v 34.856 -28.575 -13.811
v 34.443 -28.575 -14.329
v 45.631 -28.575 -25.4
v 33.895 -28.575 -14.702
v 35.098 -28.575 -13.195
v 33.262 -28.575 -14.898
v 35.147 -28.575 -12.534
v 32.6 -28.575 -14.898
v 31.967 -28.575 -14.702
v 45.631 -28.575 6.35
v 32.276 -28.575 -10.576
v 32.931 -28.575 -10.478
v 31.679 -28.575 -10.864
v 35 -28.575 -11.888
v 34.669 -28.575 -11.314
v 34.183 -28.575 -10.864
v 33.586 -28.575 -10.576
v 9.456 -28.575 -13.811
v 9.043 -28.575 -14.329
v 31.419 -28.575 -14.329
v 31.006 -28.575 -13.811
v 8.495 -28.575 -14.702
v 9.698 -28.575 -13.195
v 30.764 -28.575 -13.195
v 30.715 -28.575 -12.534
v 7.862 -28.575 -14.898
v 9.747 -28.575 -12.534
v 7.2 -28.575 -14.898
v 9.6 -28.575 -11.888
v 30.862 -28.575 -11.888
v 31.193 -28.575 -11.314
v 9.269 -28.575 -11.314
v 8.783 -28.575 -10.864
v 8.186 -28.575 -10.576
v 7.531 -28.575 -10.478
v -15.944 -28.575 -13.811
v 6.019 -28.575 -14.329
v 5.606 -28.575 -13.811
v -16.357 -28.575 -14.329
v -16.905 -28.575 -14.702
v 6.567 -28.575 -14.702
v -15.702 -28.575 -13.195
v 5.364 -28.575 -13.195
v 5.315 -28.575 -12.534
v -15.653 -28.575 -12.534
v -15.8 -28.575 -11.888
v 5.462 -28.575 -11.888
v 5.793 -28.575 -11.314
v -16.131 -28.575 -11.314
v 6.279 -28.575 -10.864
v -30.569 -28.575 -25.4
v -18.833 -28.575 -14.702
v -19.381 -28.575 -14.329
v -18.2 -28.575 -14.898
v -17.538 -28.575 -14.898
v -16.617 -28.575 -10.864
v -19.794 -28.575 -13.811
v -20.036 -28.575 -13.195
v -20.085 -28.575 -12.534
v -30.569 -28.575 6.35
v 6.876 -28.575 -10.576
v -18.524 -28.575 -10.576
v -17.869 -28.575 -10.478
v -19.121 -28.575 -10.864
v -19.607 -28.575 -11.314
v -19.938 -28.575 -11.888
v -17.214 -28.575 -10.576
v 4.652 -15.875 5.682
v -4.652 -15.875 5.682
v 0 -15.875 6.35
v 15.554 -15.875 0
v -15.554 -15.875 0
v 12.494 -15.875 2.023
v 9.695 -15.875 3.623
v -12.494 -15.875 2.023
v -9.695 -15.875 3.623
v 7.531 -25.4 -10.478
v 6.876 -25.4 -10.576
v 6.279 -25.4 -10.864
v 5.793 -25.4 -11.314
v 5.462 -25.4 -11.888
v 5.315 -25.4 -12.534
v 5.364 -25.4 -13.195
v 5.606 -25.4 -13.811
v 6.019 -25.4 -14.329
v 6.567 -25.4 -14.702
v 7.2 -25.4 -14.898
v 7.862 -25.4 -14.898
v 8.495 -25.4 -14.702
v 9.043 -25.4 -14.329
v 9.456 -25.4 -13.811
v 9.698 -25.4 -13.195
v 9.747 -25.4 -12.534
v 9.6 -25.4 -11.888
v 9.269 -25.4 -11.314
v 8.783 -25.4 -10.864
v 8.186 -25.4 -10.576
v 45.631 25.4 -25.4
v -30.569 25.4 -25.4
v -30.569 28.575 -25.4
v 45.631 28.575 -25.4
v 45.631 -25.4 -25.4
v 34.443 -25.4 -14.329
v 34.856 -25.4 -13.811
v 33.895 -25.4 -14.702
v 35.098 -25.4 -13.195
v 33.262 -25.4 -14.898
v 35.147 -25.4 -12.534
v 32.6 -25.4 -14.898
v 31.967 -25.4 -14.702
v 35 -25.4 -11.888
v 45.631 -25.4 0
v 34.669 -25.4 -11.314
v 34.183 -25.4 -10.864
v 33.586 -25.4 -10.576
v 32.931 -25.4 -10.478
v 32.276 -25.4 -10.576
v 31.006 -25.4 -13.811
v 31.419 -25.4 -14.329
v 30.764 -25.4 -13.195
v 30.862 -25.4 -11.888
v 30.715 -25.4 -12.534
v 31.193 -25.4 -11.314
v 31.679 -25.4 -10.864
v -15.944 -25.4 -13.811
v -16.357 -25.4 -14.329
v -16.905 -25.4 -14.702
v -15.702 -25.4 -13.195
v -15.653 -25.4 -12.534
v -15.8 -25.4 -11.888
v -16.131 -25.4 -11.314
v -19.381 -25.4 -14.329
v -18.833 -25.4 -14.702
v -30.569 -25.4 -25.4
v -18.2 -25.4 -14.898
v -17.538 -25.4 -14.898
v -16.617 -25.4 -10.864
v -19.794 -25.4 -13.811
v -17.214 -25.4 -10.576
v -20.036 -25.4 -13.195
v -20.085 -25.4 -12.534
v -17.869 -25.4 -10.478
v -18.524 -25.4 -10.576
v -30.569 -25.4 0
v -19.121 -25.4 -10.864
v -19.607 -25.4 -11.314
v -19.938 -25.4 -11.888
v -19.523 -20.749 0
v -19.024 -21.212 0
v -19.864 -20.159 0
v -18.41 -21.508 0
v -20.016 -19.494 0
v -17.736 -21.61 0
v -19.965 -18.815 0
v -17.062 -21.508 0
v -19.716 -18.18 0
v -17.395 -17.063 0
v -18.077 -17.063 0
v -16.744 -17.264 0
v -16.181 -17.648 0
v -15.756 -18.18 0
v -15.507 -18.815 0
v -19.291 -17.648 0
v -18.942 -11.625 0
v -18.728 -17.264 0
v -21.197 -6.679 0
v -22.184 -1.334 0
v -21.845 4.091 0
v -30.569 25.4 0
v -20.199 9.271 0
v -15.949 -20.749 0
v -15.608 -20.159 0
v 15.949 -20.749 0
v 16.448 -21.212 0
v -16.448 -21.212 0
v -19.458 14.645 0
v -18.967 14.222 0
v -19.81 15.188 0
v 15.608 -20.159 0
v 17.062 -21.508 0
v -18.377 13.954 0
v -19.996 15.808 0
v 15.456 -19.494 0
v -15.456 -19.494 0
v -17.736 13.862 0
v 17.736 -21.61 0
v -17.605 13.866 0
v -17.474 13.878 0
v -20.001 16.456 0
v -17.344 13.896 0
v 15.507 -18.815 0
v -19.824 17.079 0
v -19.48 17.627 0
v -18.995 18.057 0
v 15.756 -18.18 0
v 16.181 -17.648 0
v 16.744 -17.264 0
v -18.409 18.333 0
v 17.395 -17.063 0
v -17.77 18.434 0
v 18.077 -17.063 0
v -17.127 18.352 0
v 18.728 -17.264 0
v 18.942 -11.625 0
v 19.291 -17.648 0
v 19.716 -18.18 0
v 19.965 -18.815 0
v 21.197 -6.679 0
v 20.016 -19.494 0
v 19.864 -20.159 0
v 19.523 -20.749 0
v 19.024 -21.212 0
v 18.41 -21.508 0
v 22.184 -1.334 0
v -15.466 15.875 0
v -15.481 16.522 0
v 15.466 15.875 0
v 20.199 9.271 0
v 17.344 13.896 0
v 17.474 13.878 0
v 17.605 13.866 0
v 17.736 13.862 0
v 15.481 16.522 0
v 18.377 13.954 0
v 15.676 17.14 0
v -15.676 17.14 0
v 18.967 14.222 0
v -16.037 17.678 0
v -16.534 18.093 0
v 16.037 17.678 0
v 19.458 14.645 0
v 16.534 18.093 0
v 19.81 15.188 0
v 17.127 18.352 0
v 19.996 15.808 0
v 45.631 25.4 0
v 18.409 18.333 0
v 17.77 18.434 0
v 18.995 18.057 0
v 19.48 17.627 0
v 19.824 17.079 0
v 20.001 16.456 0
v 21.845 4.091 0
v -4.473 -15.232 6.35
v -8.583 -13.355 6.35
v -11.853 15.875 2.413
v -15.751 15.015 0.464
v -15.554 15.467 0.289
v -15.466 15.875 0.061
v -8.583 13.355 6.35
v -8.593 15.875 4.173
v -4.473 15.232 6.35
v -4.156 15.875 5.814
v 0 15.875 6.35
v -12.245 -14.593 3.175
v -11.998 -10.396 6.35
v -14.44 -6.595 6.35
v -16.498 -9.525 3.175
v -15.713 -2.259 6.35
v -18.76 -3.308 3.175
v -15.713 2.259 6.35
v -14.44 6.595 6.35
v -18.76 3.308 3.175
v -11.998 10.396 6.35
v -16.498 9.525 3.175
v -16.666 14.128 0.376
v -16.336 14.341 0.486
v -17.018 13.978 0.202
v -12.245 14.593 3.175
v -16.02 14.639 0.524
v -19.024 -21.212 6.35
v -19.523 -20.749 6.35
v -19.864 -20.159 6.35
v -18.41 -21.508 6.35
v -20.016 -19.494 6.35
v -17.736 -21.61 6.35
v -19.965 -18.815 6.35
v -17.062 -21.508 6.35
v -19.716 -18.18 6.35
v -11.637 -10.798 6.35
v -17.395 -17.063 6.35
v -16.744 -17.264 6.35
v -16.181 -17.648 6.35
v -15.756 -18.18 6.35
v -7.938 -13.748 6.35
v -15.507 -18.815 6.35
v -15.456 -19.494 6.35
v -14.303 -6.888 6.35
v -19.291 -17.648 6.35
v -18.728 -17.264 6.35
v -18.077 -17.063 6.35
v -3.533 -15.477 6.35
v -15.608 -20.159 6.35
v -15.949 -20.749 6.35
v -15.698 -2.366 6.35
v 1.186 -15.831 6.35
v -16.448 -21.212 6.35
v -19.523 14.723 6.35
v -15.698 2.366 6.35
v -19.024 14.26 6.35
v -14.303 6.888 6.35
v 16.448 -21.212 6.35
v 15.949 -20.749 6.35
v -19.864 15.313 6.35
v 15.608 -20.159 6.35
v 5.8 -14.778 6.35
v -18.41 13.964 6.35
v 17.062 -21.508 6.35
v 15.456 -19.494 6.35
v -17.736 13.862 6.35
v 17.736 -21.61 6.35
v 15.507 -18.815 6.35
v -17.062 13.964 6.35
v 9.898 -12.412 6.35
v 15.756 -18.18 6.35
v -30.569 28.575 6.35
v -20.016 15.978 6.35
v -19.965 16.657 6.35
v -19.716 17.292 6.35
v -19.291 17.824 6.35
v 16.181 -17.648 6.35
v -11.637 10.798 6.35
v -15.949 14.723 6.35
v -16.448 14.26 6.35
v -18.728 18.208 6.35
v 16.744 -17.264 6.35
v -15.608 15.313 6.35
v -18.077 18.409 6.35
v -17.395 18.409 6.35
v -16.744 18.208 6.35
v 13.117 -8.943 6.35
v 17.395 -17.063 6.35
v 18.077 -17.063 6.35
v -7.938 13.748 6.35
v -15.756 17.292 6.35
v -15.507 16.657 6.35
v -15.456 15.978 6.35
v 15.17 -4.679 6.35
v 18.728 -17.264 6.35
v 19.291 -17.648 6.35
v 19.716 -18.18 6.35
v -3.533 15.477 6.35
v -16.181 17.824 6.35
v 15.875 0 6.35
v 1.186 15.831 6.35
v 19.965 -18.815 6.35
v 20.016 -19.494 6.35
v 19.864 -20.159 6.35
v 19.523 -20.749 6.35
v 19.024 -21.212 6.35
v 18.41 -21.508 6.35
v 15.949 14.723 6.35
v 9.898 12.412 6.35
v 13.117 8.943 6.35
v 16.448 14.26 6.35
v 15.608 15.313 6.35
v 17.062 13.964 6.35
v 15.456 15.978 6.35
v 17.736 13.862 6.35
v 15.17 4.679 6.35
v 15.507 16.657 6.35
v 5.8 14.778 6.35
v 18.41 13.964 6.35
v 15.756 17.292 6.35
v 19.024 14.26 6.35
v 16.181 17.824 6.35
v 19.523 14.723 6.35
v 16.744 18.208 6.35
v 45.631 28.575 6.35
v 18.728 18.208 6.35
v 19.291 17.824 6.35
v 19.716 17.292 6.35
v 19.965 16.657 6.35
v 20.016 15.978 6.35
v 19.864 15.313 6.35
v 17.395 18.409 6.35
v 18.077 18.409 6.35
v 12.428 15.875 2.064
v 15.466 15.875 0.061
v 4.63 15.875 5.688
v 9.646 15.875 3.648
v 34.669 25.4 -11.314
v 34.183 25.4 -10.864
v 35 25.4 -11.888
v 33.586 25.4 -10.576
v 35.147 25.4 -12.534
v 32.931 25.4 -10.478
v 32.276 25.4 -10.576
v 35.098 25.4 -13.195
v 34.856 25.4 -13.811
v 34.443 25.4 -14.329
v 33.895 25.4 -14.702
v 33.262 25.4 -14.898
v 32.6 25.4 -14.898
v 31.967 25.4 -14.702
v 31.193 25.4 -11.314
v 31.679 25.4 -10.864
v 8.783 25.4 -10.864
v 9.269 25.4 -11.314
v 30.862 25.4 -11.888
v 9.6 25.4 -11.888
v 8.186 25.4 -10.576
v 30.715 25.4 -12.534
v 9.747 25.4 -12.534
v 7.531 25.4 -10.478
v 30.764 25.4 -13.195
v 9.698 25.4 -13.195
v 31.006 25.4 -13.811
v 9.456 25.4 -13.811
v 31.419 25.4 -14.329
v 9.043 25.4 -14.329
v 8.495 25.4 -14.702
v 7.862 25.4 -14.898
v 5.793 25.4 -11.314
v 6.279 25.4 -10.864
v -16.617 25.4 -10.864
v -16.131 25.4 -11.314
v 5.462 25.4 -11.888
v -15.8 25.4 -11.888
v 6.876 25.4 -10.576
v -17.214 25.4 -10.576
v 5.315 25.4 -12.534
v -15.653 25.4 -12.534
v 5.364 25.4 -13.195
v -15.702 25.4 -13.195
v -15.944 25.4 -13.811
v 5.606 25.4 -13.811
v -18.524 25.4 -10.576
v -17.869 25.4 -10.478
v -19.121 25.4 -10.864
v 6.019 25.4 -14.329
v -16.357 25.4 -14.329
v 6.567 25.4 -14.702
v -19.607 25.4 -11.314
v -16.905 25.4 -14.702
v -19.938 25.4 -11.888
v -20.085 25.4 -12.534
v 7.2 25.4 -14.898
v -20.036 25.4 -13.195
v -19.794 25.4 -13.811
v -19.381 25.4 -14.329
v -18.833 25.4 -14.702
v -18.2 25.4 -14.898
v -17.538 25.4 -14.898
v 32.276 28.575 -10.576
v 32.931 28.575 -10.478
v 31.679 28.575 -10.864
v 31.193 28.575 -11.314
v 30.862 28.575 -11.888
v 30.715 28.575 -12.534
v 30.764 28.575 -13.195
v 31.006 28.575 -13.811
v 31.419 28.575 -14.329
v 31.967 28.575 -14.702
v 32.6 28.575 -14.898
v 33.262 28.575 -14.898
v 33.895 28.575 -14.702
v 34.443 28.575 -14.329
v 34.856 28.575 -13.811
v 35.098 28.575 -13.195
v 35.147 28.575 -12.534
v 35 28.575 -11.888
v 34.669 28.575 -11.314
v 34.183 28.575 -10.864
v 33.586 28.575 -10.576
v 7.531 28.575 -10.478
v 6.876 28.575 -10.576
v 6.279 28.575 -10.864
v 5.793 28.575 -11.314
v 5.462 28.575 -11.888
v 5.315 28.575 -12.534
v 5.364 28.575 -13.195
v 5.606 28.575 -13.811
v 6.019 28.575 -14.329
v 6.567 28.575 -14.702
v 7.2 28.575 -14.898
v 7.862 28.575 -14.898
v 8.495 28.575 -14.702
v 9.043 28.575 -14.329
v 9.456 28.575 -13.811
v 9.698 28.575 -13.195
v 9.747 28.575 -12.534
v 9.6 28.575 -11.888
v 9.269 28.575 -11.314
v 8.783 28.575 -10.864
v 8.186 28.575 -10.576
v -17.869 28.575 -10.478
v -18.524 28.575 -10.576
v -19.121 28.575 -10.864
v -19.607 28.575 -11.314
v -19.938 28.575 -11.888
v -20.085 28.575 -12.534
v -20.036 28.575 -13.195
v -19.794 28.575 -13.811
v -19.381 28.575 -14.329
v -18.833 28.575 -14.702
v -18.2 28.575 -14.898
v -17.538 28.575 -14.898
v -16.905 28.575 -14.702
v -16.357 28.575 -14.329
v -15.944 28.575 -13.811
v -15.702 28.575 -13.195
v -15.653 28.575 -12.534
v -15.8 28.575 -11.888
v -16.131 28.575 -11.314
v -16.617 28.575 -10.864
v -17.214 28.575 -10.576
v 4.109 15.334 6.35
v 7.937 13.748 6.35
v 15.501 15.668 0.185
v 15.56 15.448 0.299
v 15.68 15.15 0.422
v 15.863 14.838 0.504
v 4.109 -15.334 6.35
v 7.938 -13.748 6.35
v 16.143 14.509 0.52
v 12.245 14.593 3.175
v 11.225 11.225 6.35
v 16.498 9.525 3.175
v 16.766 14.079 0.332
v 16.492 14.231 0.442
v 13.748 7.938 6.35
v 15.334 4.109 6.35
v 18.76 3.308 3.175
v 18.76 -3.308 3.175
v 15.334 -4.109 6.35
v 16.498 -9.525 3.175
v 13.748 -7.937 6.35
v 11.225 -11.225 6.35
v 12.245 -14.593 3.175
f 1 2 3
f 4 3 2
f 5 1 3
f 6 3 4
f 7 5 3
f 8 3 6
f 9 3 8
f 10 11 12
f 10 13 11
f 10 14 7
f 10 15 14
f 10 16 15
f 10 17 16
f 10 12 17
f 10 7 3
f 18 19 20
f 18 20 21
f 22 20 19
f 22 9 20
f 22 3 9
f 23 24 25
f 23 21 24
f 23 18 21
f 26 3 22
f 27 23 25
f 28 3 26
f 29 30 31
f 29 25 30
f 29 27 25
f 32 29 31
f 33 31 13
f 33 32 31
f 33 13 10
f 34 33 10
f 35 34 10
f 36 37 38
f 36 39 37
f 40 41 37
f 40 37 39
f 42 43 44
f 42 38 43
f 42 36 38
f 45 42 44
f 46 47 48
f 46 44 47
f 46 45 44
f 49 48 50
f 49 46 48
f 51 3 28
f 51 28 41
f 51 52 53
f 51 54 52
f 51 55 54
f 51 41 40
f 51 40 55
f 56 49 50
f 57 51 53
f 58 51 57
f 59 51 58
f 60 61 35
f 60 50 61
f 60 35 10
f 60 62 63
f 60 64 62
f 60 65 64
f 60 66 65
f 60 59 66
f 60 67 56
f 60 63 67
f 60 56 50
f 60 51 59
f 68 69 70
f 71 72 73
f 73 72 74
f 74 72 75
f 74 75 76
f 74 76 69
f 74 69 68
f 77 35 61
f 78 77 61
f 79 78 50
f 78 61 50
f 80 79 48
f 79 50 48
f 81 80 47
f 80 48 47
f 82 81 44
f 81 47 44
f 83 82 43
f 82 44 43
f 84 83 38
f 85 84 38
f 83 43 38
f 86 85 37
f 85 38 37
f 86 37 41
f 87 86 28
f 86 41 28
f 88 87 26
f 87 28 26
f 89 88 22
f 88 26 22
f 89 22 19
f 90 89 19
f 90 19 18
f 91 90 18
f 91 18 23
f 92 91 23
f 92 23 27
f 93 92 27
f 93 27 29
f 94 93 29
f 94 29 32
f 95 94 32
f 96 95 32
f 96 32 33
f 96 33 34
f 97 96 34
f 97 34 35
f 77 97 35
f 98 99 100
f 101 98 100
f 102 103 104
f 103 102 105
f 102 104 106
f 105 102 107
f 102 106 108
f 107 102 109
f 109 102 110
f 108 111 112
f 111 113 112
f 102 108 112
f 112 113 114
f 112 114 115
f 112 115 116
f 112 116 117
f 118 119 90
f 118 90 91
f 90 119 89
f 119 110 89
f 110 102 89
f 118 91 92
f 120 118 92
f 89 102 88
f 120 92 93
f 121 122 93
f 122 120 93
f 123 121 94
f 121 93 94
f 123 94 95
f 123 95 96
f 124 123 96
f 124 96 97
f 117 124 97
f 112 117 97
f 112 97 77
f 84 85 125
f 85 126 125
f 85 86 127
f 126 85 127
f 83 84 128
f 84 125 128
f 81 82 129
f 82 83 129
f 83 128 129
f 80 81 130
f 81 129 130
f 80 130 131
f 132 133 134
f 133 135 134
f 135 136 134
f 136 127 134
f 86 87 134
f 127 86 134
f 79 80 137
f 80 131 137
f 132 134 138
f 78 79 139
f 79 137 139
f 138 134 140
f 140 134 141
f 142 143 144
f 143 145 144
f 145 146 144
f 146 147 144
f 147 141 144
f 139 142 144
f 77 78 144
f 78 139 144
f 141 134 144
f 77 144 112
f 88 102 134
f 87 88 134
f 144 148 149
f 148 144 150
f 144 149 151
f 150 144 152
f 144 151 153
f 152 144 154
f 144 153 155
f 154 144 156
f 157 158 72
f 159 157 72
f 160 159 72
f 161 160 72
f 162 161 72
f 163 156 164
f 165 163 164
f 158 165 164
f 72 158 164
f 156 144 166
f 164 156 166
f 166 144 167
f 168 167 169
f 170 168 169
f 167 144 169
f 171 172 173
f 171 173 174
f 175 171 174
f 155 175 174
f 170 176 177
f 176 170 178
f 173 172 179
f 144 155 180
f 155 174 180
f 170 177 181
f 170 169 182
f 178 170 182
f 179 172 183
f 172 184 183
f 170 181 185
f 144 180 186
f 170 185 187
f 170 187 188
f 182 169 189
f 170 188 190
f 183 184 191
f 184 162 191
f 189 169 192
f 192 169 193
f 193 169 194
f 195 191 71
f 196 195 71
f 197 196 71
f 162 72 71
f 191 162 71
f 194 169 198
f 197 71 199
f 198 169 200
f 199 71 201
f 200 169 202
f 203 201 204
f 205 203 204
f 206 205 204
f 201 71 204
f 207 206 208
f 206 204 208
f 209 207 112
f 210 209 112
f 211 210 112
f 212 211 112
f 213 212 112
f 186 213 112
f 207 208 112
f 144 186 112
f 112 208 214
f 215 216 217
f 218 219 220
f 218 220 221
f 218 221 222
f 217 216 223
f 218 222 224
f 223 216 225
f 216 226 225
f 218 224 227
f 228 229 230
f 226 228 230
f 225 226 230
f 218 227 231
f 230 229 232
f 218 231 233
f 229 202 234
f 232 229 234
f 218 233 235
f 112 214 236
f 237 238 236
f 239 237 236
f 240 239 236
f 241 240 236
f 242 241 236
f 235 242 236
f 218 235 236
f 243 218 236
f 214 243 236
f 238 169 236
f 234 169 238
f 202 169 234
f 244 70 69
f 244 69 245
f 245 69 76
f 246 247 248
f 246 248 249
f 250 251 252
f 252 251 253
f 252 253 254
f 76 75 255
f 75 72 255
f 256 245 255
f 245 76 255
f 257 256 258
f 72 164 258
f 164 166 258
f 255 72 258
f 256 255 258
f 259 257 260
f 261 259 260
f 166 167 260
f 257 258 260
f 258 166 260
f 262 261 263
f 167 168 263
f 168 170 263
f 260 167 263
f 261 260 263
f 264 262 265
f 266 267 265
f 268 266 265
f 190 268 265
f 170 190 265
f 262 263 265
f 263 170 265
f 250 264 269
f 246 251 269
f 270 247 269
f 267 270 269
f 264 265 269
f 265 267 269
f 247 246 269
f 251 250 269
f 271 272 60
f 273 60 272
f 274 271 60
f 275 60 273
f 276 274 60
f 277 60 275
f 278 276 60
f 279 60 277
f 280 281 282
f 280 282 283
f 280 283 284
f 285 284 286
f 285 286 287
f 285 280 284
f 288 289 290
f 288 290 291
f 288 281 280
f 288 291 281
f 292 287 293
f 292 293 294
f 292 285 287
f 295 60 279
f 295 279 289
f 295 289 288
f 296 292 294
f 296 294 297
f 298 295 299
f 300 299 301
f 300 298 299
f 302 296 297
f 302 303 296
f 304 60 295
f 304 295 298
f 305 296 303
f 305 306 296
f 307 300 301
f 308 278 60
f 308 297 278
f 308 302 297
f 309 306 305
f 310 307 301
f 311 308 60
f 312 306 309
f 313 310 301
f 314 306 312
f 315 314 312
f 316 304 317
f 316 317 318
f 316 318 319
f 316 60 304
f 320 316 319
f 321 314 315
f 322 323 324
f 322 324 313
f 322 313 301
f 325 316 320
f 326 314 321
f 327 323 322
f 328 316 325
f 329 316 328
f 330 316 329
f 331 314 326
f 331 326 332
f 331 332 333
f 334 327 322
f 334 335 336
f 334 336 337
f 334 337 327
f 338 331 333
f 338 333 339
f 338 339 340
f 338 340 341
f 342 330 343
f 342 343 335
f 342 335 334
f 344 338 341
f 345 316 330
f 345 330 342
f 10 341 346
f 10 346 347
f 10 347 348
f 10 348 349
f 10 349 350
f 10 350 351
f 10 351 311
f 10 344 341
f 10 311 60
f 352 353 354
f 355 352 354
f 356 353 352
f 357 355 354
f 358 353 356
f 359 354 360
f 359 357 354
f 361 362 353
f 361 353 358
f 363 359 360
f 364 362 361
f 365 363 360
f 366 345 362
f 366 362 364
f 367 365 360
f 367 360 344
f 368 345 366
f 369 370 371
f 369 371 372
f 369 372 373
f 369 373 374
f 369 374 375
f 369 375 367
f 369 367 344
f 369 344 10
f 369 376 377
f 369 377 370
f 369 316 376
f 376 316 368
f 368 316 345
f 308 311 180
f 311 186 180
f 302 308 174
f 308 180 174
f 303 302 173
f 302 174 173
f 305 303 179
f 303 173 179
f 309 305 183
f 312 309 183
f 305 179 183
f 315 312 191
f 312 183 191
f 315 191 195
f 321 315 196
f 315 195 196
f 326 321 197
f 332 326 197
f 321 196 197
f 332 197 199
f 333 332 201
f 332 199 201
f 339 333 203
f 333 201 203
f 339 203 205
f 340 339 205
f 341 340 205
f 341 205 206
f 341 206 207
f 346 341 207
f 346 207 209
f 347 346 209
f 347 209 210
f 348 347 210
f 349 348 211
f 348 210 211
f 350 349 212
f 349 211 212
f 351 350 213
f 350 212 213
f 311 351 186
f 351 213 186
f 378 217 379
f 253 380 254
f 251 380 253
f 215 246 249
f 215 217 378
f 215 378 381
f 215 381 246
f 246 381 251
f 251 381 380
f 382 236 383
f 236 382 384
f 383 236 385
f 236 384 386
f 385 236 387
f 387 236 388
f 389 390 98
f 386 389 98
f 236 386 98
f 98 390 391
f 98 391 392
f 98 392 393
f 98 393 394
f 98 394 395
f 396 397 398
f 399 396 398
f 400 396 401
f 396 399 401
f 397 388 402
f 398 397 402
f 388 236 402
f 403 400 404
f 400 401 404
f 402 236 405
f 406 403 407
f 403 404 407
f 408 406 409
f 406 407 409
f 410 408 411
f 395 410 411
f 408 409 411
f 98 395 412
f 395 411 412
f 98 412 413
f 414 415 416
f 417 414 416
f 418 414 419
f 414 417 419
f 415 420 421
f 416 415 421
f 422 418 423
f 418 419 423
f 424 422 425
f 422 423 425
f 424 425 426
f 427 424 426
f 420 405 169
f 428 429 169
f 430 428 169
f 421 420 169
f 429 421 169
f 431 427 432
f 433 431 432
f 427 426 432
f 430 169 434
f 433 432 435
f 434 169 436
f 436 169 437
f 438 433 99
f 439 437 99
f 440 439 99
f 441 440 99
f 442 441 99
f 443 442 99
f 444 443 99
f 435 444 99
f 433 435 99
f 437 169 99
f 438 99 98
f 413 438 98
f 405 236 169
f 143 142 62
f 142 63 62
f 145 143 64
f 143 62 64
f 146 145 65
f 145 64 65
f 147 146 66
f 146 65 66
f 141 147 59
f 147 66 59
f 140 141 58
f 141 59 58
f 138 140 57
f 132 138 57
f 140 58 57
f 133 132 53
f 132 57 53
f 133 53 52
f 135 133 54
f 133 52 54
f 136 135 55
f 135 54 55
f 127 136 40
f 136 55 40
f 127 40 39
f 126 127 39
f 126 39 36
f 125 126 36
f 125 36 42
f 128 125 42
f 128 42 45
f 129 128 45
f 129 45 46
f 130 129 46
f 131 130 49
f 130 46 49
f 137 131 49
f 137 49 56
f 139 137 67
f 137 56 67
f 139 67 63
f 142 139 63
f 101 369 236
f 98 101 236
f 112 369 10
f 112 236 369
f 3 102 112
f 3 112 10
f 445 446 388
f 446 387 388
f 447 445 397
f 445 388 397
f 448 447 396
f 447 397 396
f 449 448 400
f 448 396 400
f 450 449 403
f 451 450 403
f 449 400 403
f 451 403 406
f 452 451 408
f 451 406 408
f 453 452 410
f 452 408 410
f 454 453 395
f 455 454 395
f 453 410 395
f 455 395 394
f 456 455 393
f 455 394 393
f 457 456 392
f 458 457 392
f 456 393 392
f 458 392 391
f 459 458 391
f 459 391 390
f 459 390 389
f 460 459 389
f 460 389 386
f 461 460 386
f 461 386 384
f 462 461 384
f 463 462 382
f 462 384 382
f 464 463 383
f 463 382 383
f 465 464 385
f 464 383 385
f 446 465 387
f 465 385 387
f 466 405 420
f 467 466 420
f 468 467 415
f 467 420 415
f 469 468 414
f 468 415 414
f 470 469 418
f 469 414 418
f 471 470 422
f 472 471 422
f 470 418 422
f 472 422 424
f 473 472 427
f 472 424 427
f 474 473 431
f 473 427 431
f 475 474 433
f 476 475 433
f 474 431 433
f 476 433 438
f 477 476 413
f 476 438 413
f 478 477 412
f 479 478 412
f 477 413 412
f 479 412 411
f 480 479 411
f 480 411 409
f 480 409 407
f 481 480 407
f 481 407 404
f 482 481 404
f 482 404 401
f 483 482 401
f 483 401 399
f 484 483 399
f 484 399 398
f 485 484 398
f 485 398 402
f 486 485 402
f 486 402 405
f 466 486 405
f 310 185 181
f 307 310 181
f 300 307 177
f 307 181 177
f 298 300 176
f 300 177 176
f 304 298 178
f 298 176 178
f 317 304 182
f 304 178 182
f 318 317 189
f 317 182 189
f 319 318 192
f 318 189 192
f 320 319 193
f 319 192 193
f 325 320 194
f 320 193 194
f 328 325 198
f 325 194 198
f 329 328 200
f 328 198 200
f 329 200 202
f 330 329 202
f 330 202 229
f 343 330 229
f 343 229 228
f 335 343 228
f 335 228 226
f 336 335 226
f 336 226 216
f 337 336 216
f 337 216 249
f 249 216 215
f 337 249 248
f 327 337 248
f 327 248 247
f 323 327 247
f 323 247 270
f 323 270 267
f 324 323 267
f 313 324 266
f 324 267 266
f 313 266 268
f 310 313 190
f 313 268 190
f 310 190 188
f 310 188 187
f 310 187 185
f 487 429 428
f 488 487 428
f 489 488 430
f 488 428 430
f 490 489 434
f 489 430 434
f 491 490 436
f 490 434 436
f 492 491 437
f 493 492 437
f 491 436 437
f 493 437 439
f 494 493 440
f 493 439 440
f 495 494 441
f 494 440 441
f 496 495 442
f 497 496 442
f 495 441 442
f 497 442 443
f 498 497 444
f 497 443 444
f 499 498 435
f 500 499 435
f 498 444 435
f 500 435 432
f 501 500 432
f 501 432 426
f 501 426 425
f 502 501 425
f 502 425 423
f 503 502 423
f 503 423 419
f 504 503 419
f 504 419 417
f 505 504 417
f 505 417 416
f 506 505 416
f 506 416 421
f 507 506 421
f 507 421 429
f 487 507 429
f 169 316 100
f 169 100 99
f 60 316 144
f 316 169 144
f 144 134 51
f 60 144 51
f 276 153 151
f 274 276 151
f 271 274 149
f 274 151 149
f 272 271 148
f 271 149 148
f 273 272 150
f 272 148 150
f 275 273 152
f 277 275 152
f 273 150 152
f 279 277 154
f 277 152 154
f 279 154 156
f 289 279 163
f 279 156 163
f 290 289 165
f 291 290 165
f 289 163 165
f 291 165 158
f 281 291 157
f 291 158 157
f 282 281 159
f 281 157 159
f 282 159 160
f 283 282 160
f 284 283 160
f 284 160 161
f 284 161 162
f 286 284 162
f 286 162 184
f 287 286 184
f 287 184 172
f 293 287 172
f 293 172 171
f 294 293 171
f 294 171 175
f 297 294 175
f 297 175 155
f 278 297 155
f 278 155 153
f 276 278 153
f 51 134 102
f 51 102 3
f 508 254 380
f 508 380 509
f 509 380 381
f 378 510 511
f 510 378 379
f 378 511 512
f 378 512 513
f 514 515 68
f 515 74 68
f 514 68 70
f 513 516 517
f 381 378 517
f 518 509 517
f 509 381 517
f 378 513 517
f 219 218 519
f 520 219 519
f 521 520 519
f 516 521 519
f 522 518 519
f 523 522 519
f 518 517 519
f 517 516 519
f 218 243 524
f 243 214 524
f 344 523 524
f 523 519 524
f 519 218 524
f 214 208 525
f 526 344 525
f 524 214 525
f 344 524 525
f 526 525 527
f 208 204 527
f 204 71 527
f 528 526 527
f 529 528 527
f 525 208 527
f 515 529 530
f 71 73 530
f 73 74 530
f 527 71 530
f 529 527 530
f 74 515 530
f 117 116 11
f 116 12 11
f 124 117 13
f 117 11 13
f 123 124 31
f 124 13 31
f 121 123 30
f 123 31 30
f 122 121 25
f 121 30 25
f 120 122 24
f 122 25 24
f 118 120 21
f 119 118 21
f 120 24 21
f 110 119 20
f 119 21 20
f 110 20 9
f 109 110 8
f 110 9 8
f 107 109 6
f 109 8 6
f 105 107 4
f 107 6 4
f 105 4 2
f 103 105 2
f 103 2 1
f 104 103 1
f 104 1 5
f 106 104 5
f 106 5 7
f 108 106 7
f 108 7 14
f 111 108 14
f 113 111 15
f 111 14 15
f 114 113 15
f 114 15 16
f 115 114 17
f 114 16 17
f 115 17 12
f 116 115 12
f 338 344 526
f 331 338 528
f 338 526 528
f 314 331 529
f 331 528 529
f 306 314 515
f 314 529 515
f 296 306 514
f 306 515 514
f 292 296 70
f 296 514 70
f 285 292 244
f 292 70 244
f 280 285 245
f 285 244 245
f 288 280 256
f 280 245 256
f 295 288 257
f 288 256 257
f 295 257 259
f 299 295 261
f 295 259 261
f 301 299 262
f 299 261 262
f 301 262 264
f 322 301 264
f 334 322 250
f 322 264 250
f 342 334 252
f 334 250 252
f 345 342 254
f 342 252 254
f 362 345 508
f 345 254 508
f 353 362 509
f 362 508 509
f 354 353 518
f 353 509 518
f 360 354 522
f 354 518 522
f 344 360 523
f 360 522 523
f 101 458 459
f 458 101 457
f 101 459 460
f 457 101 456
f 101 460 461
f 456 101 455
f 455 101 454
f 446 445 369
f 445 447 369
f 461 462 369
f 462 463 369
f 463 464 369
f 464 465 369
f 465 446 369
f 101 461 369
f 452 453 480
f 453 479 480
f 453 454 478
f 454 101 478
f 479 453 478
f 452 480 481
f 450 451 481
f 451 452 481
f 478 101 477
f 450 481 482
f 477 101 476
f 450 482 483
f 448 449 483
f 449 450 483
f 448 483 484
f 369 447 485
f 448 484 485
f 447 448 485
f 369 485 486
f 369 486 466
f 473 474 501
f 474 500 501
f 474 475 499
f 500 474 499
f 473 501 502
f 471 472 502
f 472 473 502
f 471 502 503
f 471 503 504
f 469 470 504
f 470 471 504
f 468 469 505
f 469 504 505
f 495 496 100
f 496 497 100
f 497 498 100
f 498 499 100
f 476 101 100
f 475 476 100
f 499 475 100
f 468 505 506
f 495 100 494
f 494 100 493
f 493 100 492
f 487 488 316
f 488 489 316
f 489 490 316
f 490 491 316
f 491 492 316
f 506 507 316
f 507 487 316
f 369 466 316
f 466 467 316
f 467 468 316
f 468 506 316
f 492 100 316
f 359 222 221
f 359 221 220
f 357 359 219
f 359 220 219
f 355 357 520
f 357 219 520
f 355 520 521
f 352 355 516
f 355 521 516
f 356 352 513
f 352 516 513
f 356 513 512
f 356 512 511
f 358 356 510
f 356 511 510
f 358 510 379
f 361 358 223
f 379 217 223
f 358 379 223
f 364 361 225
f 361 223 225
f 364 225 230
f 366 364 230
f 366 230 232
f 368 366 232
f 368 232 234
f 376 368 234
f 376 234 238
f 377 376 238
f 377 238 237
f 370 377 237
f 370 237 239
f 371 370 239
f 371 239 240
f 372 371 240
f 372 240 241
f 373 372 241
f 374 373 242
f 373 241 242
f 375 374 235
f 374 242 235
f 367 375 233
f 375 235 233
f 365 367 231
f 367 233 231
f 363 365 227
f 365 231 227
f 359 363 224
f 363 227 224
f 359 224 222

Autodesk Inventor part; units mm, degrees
ref_plane "YZ Plane" through (0, 0, 0) normal (1, 0, 0) x (0, 1, 0)
ref_plane "XZ Plane" through (0, 0, 0) normal (0, 1, 0) x (-1, 0, 0)
ref_plane "XY Plane" through (0, 0, 0) normal (0, 0, 1) x (1, 0, 0)
sketch "Sketch1" plane through (0, 0, 0) normal (0, 0, 1) x (1, 0, 0)
  circle A0 centre (0, 0) radius 15.875
  line L0 (0, 15.875) -> (0, 25.4)
  line L1 (0, 25.4) -> (-30.5689, 25.4)
  line L2 (-30.5689, 25.4) -> (-30.5689, -25.4)
  line L3 (-30.5689, -25.4) -> (0, -25.4)
  line L4 (0, -25.4) -> (0, -15.875)
  line L5 (0, -15.875) -> (0, 15.875)
  line L6 (0, 25.4) -> (45.6311, 25.4)
  line L7 (45.6311, 25.4) -> (45.6311, -25.4)
  line L8 (45.6311, -25.4) -> (0, -25.4)
  line L9 (0, -25.4) -> (0, 25.4)
  line L10 (7.5311, 25.4) -> (7.5311, -25.4) construction
  line L11 (-17.8689, 25.4) -> (-17.8689, -25.4) construction
  line L12 (32.9311, 25.4) -> (32.9311, -25.4) construction
  dimension "d0" = 31.75
  dimension "d1" = 50.8
  dimension "d3" = 7.5311
  dimension "d6" = 38.1
  dimension "d7" = 38.1
  dimension "d8" = 25.4
  dimension "d9" = 25.4
extrude "Extrusion1" add sketch "Sketch1" along normal blind 6.35 contours A0 L0 L6 L7 L8 L4 | A0 L4 L3 L2 L1 L0
chamfer "Chamfer1" distance 6.35 distance2 6.35 1 edges at (-15.875, 0, 0) measured on face at (15.8235, -1.2774, 4.2333)
sketch "Sketch2" plane through (-30.5689, -25.4, 0) normal (-1, 0, 0) x (0, 0, 1)
  line L0 (0, 0) -> (6.35, 0) projected
  line L1 (6.35, 0) -> (-25.4, 0)
  line L2 (-25.4, 0) -> (-25.4, -3.175)
  line L3 (-25.4, -3.175) -> (6.35, -3.175)
  line L4 (6.35, -3.175) -> (6.35, 0)
  line L5 (6.35, 50.8) -> (-25.4, 50.8)
  line L6 (-25.4, 50.8) -> (-25.4, 53.975)
  line L7 (-25.4, 53.975) -> (6.35, 53.975)
  line L8 (6.35, 53.975) -> (6.35, 50.8)
  line L9 (0, 50.8) -> (0, 0) projected
  point P0 (0, 25.4)
  dimension "d15" = 3.175
  dimension "d16" = 25.4
extrude "Extrusion2" add sketch "Sketch2" against normal up to surface (76.2 mm away)
sketch "Sketch3" plane through (-30.5689, 28.575, 6.35) normal (0, 1, 0) x (1, 0, 0)
  line L0 (0, 0) -> (0, 31.75) projected
  line L1 (0, 31.75) -> (76.2, 31.75) projected
  point P0 (30.5689, 6.35)
  point P1 (12.7, 19.05)
  point P2 (38.1, 19.05)
  point P3 (63.5, 19.05)
  dimension "d19" = 12.7
  dimension "d20" = 25.4
  dimension "d21" = 25.4
  dimension "d22" = 12.7
hole "Hole1" at (-17.8689, 28.575, -12.7) at (7.5311, 28.575, -12.7) at (32.9311, 28.575, -12.7) direction (0, -1, 0) diameter 4.445 end through all
sketch "Sketch4" plane through (0, 0, 0) normal (0, 0, -1) x (-1, 0, 0)
  line L0 (22.225, -15.875) -> (-22.225, -15.875)
  line L1 (-22.225, -15.875) -> (-22.225, 15.875)
  line L2 (-22.225, 15.875) -> (22.225, 15.875)
  line L3 (22.225, 15.875) -> (22.225, -15.875)
  line L4 (22.225, -15.875) -> (-22.225, 15.875) construction
  line L5 (-22.225, -15.875) -> (22.225, 15.875) construction
  circle A0 centre (0, 0) radius 15.875 projected
  circle A1 centre (0, 0) radius 22.225 projected
  point P0 (15.5543, 15.875)
  point P1 (-15.5543, 15.875)
  point P2 (-15.5543, -15.875)
  point P3 (15.5543, -15.875)
extrude "Extrusion3" add sketch "Sketch4" against normal up to surface (6.35 mm away) contours A1 L0 | L2 A1
sketch "Sketch5" plane through (0, 0, 6.35) normal (0, 0, 1) x (1, 0, 0)
  circle A0 centre (0, -1.5875) radius 25.0825 construction
  line L0 (-17.736, -19.3235) -> (17.736, 16.1485) construction
  line L1 (-17.736, 16.1485) -> (17.736, -19.3235) construction
  line L2 (-17.736, -19.3235) -> (17.736, -19.3235) construction
  point P0 (0, 0)
  point P1 (0, -1.5875)
  dimension "d32" = 1.5875
  dimension "d34" = 50.165
hole "Hole2" at (-17.736, -19.3235, 6.35) at (17.736, 16.1485, 6.35) at (-17.736, 16.1485, 6.35) at (17.736, -19.3235, 6.35) direction (0, 0, -1) diameter 4.572 end through all
properties part number "Inner Channel Guide"
